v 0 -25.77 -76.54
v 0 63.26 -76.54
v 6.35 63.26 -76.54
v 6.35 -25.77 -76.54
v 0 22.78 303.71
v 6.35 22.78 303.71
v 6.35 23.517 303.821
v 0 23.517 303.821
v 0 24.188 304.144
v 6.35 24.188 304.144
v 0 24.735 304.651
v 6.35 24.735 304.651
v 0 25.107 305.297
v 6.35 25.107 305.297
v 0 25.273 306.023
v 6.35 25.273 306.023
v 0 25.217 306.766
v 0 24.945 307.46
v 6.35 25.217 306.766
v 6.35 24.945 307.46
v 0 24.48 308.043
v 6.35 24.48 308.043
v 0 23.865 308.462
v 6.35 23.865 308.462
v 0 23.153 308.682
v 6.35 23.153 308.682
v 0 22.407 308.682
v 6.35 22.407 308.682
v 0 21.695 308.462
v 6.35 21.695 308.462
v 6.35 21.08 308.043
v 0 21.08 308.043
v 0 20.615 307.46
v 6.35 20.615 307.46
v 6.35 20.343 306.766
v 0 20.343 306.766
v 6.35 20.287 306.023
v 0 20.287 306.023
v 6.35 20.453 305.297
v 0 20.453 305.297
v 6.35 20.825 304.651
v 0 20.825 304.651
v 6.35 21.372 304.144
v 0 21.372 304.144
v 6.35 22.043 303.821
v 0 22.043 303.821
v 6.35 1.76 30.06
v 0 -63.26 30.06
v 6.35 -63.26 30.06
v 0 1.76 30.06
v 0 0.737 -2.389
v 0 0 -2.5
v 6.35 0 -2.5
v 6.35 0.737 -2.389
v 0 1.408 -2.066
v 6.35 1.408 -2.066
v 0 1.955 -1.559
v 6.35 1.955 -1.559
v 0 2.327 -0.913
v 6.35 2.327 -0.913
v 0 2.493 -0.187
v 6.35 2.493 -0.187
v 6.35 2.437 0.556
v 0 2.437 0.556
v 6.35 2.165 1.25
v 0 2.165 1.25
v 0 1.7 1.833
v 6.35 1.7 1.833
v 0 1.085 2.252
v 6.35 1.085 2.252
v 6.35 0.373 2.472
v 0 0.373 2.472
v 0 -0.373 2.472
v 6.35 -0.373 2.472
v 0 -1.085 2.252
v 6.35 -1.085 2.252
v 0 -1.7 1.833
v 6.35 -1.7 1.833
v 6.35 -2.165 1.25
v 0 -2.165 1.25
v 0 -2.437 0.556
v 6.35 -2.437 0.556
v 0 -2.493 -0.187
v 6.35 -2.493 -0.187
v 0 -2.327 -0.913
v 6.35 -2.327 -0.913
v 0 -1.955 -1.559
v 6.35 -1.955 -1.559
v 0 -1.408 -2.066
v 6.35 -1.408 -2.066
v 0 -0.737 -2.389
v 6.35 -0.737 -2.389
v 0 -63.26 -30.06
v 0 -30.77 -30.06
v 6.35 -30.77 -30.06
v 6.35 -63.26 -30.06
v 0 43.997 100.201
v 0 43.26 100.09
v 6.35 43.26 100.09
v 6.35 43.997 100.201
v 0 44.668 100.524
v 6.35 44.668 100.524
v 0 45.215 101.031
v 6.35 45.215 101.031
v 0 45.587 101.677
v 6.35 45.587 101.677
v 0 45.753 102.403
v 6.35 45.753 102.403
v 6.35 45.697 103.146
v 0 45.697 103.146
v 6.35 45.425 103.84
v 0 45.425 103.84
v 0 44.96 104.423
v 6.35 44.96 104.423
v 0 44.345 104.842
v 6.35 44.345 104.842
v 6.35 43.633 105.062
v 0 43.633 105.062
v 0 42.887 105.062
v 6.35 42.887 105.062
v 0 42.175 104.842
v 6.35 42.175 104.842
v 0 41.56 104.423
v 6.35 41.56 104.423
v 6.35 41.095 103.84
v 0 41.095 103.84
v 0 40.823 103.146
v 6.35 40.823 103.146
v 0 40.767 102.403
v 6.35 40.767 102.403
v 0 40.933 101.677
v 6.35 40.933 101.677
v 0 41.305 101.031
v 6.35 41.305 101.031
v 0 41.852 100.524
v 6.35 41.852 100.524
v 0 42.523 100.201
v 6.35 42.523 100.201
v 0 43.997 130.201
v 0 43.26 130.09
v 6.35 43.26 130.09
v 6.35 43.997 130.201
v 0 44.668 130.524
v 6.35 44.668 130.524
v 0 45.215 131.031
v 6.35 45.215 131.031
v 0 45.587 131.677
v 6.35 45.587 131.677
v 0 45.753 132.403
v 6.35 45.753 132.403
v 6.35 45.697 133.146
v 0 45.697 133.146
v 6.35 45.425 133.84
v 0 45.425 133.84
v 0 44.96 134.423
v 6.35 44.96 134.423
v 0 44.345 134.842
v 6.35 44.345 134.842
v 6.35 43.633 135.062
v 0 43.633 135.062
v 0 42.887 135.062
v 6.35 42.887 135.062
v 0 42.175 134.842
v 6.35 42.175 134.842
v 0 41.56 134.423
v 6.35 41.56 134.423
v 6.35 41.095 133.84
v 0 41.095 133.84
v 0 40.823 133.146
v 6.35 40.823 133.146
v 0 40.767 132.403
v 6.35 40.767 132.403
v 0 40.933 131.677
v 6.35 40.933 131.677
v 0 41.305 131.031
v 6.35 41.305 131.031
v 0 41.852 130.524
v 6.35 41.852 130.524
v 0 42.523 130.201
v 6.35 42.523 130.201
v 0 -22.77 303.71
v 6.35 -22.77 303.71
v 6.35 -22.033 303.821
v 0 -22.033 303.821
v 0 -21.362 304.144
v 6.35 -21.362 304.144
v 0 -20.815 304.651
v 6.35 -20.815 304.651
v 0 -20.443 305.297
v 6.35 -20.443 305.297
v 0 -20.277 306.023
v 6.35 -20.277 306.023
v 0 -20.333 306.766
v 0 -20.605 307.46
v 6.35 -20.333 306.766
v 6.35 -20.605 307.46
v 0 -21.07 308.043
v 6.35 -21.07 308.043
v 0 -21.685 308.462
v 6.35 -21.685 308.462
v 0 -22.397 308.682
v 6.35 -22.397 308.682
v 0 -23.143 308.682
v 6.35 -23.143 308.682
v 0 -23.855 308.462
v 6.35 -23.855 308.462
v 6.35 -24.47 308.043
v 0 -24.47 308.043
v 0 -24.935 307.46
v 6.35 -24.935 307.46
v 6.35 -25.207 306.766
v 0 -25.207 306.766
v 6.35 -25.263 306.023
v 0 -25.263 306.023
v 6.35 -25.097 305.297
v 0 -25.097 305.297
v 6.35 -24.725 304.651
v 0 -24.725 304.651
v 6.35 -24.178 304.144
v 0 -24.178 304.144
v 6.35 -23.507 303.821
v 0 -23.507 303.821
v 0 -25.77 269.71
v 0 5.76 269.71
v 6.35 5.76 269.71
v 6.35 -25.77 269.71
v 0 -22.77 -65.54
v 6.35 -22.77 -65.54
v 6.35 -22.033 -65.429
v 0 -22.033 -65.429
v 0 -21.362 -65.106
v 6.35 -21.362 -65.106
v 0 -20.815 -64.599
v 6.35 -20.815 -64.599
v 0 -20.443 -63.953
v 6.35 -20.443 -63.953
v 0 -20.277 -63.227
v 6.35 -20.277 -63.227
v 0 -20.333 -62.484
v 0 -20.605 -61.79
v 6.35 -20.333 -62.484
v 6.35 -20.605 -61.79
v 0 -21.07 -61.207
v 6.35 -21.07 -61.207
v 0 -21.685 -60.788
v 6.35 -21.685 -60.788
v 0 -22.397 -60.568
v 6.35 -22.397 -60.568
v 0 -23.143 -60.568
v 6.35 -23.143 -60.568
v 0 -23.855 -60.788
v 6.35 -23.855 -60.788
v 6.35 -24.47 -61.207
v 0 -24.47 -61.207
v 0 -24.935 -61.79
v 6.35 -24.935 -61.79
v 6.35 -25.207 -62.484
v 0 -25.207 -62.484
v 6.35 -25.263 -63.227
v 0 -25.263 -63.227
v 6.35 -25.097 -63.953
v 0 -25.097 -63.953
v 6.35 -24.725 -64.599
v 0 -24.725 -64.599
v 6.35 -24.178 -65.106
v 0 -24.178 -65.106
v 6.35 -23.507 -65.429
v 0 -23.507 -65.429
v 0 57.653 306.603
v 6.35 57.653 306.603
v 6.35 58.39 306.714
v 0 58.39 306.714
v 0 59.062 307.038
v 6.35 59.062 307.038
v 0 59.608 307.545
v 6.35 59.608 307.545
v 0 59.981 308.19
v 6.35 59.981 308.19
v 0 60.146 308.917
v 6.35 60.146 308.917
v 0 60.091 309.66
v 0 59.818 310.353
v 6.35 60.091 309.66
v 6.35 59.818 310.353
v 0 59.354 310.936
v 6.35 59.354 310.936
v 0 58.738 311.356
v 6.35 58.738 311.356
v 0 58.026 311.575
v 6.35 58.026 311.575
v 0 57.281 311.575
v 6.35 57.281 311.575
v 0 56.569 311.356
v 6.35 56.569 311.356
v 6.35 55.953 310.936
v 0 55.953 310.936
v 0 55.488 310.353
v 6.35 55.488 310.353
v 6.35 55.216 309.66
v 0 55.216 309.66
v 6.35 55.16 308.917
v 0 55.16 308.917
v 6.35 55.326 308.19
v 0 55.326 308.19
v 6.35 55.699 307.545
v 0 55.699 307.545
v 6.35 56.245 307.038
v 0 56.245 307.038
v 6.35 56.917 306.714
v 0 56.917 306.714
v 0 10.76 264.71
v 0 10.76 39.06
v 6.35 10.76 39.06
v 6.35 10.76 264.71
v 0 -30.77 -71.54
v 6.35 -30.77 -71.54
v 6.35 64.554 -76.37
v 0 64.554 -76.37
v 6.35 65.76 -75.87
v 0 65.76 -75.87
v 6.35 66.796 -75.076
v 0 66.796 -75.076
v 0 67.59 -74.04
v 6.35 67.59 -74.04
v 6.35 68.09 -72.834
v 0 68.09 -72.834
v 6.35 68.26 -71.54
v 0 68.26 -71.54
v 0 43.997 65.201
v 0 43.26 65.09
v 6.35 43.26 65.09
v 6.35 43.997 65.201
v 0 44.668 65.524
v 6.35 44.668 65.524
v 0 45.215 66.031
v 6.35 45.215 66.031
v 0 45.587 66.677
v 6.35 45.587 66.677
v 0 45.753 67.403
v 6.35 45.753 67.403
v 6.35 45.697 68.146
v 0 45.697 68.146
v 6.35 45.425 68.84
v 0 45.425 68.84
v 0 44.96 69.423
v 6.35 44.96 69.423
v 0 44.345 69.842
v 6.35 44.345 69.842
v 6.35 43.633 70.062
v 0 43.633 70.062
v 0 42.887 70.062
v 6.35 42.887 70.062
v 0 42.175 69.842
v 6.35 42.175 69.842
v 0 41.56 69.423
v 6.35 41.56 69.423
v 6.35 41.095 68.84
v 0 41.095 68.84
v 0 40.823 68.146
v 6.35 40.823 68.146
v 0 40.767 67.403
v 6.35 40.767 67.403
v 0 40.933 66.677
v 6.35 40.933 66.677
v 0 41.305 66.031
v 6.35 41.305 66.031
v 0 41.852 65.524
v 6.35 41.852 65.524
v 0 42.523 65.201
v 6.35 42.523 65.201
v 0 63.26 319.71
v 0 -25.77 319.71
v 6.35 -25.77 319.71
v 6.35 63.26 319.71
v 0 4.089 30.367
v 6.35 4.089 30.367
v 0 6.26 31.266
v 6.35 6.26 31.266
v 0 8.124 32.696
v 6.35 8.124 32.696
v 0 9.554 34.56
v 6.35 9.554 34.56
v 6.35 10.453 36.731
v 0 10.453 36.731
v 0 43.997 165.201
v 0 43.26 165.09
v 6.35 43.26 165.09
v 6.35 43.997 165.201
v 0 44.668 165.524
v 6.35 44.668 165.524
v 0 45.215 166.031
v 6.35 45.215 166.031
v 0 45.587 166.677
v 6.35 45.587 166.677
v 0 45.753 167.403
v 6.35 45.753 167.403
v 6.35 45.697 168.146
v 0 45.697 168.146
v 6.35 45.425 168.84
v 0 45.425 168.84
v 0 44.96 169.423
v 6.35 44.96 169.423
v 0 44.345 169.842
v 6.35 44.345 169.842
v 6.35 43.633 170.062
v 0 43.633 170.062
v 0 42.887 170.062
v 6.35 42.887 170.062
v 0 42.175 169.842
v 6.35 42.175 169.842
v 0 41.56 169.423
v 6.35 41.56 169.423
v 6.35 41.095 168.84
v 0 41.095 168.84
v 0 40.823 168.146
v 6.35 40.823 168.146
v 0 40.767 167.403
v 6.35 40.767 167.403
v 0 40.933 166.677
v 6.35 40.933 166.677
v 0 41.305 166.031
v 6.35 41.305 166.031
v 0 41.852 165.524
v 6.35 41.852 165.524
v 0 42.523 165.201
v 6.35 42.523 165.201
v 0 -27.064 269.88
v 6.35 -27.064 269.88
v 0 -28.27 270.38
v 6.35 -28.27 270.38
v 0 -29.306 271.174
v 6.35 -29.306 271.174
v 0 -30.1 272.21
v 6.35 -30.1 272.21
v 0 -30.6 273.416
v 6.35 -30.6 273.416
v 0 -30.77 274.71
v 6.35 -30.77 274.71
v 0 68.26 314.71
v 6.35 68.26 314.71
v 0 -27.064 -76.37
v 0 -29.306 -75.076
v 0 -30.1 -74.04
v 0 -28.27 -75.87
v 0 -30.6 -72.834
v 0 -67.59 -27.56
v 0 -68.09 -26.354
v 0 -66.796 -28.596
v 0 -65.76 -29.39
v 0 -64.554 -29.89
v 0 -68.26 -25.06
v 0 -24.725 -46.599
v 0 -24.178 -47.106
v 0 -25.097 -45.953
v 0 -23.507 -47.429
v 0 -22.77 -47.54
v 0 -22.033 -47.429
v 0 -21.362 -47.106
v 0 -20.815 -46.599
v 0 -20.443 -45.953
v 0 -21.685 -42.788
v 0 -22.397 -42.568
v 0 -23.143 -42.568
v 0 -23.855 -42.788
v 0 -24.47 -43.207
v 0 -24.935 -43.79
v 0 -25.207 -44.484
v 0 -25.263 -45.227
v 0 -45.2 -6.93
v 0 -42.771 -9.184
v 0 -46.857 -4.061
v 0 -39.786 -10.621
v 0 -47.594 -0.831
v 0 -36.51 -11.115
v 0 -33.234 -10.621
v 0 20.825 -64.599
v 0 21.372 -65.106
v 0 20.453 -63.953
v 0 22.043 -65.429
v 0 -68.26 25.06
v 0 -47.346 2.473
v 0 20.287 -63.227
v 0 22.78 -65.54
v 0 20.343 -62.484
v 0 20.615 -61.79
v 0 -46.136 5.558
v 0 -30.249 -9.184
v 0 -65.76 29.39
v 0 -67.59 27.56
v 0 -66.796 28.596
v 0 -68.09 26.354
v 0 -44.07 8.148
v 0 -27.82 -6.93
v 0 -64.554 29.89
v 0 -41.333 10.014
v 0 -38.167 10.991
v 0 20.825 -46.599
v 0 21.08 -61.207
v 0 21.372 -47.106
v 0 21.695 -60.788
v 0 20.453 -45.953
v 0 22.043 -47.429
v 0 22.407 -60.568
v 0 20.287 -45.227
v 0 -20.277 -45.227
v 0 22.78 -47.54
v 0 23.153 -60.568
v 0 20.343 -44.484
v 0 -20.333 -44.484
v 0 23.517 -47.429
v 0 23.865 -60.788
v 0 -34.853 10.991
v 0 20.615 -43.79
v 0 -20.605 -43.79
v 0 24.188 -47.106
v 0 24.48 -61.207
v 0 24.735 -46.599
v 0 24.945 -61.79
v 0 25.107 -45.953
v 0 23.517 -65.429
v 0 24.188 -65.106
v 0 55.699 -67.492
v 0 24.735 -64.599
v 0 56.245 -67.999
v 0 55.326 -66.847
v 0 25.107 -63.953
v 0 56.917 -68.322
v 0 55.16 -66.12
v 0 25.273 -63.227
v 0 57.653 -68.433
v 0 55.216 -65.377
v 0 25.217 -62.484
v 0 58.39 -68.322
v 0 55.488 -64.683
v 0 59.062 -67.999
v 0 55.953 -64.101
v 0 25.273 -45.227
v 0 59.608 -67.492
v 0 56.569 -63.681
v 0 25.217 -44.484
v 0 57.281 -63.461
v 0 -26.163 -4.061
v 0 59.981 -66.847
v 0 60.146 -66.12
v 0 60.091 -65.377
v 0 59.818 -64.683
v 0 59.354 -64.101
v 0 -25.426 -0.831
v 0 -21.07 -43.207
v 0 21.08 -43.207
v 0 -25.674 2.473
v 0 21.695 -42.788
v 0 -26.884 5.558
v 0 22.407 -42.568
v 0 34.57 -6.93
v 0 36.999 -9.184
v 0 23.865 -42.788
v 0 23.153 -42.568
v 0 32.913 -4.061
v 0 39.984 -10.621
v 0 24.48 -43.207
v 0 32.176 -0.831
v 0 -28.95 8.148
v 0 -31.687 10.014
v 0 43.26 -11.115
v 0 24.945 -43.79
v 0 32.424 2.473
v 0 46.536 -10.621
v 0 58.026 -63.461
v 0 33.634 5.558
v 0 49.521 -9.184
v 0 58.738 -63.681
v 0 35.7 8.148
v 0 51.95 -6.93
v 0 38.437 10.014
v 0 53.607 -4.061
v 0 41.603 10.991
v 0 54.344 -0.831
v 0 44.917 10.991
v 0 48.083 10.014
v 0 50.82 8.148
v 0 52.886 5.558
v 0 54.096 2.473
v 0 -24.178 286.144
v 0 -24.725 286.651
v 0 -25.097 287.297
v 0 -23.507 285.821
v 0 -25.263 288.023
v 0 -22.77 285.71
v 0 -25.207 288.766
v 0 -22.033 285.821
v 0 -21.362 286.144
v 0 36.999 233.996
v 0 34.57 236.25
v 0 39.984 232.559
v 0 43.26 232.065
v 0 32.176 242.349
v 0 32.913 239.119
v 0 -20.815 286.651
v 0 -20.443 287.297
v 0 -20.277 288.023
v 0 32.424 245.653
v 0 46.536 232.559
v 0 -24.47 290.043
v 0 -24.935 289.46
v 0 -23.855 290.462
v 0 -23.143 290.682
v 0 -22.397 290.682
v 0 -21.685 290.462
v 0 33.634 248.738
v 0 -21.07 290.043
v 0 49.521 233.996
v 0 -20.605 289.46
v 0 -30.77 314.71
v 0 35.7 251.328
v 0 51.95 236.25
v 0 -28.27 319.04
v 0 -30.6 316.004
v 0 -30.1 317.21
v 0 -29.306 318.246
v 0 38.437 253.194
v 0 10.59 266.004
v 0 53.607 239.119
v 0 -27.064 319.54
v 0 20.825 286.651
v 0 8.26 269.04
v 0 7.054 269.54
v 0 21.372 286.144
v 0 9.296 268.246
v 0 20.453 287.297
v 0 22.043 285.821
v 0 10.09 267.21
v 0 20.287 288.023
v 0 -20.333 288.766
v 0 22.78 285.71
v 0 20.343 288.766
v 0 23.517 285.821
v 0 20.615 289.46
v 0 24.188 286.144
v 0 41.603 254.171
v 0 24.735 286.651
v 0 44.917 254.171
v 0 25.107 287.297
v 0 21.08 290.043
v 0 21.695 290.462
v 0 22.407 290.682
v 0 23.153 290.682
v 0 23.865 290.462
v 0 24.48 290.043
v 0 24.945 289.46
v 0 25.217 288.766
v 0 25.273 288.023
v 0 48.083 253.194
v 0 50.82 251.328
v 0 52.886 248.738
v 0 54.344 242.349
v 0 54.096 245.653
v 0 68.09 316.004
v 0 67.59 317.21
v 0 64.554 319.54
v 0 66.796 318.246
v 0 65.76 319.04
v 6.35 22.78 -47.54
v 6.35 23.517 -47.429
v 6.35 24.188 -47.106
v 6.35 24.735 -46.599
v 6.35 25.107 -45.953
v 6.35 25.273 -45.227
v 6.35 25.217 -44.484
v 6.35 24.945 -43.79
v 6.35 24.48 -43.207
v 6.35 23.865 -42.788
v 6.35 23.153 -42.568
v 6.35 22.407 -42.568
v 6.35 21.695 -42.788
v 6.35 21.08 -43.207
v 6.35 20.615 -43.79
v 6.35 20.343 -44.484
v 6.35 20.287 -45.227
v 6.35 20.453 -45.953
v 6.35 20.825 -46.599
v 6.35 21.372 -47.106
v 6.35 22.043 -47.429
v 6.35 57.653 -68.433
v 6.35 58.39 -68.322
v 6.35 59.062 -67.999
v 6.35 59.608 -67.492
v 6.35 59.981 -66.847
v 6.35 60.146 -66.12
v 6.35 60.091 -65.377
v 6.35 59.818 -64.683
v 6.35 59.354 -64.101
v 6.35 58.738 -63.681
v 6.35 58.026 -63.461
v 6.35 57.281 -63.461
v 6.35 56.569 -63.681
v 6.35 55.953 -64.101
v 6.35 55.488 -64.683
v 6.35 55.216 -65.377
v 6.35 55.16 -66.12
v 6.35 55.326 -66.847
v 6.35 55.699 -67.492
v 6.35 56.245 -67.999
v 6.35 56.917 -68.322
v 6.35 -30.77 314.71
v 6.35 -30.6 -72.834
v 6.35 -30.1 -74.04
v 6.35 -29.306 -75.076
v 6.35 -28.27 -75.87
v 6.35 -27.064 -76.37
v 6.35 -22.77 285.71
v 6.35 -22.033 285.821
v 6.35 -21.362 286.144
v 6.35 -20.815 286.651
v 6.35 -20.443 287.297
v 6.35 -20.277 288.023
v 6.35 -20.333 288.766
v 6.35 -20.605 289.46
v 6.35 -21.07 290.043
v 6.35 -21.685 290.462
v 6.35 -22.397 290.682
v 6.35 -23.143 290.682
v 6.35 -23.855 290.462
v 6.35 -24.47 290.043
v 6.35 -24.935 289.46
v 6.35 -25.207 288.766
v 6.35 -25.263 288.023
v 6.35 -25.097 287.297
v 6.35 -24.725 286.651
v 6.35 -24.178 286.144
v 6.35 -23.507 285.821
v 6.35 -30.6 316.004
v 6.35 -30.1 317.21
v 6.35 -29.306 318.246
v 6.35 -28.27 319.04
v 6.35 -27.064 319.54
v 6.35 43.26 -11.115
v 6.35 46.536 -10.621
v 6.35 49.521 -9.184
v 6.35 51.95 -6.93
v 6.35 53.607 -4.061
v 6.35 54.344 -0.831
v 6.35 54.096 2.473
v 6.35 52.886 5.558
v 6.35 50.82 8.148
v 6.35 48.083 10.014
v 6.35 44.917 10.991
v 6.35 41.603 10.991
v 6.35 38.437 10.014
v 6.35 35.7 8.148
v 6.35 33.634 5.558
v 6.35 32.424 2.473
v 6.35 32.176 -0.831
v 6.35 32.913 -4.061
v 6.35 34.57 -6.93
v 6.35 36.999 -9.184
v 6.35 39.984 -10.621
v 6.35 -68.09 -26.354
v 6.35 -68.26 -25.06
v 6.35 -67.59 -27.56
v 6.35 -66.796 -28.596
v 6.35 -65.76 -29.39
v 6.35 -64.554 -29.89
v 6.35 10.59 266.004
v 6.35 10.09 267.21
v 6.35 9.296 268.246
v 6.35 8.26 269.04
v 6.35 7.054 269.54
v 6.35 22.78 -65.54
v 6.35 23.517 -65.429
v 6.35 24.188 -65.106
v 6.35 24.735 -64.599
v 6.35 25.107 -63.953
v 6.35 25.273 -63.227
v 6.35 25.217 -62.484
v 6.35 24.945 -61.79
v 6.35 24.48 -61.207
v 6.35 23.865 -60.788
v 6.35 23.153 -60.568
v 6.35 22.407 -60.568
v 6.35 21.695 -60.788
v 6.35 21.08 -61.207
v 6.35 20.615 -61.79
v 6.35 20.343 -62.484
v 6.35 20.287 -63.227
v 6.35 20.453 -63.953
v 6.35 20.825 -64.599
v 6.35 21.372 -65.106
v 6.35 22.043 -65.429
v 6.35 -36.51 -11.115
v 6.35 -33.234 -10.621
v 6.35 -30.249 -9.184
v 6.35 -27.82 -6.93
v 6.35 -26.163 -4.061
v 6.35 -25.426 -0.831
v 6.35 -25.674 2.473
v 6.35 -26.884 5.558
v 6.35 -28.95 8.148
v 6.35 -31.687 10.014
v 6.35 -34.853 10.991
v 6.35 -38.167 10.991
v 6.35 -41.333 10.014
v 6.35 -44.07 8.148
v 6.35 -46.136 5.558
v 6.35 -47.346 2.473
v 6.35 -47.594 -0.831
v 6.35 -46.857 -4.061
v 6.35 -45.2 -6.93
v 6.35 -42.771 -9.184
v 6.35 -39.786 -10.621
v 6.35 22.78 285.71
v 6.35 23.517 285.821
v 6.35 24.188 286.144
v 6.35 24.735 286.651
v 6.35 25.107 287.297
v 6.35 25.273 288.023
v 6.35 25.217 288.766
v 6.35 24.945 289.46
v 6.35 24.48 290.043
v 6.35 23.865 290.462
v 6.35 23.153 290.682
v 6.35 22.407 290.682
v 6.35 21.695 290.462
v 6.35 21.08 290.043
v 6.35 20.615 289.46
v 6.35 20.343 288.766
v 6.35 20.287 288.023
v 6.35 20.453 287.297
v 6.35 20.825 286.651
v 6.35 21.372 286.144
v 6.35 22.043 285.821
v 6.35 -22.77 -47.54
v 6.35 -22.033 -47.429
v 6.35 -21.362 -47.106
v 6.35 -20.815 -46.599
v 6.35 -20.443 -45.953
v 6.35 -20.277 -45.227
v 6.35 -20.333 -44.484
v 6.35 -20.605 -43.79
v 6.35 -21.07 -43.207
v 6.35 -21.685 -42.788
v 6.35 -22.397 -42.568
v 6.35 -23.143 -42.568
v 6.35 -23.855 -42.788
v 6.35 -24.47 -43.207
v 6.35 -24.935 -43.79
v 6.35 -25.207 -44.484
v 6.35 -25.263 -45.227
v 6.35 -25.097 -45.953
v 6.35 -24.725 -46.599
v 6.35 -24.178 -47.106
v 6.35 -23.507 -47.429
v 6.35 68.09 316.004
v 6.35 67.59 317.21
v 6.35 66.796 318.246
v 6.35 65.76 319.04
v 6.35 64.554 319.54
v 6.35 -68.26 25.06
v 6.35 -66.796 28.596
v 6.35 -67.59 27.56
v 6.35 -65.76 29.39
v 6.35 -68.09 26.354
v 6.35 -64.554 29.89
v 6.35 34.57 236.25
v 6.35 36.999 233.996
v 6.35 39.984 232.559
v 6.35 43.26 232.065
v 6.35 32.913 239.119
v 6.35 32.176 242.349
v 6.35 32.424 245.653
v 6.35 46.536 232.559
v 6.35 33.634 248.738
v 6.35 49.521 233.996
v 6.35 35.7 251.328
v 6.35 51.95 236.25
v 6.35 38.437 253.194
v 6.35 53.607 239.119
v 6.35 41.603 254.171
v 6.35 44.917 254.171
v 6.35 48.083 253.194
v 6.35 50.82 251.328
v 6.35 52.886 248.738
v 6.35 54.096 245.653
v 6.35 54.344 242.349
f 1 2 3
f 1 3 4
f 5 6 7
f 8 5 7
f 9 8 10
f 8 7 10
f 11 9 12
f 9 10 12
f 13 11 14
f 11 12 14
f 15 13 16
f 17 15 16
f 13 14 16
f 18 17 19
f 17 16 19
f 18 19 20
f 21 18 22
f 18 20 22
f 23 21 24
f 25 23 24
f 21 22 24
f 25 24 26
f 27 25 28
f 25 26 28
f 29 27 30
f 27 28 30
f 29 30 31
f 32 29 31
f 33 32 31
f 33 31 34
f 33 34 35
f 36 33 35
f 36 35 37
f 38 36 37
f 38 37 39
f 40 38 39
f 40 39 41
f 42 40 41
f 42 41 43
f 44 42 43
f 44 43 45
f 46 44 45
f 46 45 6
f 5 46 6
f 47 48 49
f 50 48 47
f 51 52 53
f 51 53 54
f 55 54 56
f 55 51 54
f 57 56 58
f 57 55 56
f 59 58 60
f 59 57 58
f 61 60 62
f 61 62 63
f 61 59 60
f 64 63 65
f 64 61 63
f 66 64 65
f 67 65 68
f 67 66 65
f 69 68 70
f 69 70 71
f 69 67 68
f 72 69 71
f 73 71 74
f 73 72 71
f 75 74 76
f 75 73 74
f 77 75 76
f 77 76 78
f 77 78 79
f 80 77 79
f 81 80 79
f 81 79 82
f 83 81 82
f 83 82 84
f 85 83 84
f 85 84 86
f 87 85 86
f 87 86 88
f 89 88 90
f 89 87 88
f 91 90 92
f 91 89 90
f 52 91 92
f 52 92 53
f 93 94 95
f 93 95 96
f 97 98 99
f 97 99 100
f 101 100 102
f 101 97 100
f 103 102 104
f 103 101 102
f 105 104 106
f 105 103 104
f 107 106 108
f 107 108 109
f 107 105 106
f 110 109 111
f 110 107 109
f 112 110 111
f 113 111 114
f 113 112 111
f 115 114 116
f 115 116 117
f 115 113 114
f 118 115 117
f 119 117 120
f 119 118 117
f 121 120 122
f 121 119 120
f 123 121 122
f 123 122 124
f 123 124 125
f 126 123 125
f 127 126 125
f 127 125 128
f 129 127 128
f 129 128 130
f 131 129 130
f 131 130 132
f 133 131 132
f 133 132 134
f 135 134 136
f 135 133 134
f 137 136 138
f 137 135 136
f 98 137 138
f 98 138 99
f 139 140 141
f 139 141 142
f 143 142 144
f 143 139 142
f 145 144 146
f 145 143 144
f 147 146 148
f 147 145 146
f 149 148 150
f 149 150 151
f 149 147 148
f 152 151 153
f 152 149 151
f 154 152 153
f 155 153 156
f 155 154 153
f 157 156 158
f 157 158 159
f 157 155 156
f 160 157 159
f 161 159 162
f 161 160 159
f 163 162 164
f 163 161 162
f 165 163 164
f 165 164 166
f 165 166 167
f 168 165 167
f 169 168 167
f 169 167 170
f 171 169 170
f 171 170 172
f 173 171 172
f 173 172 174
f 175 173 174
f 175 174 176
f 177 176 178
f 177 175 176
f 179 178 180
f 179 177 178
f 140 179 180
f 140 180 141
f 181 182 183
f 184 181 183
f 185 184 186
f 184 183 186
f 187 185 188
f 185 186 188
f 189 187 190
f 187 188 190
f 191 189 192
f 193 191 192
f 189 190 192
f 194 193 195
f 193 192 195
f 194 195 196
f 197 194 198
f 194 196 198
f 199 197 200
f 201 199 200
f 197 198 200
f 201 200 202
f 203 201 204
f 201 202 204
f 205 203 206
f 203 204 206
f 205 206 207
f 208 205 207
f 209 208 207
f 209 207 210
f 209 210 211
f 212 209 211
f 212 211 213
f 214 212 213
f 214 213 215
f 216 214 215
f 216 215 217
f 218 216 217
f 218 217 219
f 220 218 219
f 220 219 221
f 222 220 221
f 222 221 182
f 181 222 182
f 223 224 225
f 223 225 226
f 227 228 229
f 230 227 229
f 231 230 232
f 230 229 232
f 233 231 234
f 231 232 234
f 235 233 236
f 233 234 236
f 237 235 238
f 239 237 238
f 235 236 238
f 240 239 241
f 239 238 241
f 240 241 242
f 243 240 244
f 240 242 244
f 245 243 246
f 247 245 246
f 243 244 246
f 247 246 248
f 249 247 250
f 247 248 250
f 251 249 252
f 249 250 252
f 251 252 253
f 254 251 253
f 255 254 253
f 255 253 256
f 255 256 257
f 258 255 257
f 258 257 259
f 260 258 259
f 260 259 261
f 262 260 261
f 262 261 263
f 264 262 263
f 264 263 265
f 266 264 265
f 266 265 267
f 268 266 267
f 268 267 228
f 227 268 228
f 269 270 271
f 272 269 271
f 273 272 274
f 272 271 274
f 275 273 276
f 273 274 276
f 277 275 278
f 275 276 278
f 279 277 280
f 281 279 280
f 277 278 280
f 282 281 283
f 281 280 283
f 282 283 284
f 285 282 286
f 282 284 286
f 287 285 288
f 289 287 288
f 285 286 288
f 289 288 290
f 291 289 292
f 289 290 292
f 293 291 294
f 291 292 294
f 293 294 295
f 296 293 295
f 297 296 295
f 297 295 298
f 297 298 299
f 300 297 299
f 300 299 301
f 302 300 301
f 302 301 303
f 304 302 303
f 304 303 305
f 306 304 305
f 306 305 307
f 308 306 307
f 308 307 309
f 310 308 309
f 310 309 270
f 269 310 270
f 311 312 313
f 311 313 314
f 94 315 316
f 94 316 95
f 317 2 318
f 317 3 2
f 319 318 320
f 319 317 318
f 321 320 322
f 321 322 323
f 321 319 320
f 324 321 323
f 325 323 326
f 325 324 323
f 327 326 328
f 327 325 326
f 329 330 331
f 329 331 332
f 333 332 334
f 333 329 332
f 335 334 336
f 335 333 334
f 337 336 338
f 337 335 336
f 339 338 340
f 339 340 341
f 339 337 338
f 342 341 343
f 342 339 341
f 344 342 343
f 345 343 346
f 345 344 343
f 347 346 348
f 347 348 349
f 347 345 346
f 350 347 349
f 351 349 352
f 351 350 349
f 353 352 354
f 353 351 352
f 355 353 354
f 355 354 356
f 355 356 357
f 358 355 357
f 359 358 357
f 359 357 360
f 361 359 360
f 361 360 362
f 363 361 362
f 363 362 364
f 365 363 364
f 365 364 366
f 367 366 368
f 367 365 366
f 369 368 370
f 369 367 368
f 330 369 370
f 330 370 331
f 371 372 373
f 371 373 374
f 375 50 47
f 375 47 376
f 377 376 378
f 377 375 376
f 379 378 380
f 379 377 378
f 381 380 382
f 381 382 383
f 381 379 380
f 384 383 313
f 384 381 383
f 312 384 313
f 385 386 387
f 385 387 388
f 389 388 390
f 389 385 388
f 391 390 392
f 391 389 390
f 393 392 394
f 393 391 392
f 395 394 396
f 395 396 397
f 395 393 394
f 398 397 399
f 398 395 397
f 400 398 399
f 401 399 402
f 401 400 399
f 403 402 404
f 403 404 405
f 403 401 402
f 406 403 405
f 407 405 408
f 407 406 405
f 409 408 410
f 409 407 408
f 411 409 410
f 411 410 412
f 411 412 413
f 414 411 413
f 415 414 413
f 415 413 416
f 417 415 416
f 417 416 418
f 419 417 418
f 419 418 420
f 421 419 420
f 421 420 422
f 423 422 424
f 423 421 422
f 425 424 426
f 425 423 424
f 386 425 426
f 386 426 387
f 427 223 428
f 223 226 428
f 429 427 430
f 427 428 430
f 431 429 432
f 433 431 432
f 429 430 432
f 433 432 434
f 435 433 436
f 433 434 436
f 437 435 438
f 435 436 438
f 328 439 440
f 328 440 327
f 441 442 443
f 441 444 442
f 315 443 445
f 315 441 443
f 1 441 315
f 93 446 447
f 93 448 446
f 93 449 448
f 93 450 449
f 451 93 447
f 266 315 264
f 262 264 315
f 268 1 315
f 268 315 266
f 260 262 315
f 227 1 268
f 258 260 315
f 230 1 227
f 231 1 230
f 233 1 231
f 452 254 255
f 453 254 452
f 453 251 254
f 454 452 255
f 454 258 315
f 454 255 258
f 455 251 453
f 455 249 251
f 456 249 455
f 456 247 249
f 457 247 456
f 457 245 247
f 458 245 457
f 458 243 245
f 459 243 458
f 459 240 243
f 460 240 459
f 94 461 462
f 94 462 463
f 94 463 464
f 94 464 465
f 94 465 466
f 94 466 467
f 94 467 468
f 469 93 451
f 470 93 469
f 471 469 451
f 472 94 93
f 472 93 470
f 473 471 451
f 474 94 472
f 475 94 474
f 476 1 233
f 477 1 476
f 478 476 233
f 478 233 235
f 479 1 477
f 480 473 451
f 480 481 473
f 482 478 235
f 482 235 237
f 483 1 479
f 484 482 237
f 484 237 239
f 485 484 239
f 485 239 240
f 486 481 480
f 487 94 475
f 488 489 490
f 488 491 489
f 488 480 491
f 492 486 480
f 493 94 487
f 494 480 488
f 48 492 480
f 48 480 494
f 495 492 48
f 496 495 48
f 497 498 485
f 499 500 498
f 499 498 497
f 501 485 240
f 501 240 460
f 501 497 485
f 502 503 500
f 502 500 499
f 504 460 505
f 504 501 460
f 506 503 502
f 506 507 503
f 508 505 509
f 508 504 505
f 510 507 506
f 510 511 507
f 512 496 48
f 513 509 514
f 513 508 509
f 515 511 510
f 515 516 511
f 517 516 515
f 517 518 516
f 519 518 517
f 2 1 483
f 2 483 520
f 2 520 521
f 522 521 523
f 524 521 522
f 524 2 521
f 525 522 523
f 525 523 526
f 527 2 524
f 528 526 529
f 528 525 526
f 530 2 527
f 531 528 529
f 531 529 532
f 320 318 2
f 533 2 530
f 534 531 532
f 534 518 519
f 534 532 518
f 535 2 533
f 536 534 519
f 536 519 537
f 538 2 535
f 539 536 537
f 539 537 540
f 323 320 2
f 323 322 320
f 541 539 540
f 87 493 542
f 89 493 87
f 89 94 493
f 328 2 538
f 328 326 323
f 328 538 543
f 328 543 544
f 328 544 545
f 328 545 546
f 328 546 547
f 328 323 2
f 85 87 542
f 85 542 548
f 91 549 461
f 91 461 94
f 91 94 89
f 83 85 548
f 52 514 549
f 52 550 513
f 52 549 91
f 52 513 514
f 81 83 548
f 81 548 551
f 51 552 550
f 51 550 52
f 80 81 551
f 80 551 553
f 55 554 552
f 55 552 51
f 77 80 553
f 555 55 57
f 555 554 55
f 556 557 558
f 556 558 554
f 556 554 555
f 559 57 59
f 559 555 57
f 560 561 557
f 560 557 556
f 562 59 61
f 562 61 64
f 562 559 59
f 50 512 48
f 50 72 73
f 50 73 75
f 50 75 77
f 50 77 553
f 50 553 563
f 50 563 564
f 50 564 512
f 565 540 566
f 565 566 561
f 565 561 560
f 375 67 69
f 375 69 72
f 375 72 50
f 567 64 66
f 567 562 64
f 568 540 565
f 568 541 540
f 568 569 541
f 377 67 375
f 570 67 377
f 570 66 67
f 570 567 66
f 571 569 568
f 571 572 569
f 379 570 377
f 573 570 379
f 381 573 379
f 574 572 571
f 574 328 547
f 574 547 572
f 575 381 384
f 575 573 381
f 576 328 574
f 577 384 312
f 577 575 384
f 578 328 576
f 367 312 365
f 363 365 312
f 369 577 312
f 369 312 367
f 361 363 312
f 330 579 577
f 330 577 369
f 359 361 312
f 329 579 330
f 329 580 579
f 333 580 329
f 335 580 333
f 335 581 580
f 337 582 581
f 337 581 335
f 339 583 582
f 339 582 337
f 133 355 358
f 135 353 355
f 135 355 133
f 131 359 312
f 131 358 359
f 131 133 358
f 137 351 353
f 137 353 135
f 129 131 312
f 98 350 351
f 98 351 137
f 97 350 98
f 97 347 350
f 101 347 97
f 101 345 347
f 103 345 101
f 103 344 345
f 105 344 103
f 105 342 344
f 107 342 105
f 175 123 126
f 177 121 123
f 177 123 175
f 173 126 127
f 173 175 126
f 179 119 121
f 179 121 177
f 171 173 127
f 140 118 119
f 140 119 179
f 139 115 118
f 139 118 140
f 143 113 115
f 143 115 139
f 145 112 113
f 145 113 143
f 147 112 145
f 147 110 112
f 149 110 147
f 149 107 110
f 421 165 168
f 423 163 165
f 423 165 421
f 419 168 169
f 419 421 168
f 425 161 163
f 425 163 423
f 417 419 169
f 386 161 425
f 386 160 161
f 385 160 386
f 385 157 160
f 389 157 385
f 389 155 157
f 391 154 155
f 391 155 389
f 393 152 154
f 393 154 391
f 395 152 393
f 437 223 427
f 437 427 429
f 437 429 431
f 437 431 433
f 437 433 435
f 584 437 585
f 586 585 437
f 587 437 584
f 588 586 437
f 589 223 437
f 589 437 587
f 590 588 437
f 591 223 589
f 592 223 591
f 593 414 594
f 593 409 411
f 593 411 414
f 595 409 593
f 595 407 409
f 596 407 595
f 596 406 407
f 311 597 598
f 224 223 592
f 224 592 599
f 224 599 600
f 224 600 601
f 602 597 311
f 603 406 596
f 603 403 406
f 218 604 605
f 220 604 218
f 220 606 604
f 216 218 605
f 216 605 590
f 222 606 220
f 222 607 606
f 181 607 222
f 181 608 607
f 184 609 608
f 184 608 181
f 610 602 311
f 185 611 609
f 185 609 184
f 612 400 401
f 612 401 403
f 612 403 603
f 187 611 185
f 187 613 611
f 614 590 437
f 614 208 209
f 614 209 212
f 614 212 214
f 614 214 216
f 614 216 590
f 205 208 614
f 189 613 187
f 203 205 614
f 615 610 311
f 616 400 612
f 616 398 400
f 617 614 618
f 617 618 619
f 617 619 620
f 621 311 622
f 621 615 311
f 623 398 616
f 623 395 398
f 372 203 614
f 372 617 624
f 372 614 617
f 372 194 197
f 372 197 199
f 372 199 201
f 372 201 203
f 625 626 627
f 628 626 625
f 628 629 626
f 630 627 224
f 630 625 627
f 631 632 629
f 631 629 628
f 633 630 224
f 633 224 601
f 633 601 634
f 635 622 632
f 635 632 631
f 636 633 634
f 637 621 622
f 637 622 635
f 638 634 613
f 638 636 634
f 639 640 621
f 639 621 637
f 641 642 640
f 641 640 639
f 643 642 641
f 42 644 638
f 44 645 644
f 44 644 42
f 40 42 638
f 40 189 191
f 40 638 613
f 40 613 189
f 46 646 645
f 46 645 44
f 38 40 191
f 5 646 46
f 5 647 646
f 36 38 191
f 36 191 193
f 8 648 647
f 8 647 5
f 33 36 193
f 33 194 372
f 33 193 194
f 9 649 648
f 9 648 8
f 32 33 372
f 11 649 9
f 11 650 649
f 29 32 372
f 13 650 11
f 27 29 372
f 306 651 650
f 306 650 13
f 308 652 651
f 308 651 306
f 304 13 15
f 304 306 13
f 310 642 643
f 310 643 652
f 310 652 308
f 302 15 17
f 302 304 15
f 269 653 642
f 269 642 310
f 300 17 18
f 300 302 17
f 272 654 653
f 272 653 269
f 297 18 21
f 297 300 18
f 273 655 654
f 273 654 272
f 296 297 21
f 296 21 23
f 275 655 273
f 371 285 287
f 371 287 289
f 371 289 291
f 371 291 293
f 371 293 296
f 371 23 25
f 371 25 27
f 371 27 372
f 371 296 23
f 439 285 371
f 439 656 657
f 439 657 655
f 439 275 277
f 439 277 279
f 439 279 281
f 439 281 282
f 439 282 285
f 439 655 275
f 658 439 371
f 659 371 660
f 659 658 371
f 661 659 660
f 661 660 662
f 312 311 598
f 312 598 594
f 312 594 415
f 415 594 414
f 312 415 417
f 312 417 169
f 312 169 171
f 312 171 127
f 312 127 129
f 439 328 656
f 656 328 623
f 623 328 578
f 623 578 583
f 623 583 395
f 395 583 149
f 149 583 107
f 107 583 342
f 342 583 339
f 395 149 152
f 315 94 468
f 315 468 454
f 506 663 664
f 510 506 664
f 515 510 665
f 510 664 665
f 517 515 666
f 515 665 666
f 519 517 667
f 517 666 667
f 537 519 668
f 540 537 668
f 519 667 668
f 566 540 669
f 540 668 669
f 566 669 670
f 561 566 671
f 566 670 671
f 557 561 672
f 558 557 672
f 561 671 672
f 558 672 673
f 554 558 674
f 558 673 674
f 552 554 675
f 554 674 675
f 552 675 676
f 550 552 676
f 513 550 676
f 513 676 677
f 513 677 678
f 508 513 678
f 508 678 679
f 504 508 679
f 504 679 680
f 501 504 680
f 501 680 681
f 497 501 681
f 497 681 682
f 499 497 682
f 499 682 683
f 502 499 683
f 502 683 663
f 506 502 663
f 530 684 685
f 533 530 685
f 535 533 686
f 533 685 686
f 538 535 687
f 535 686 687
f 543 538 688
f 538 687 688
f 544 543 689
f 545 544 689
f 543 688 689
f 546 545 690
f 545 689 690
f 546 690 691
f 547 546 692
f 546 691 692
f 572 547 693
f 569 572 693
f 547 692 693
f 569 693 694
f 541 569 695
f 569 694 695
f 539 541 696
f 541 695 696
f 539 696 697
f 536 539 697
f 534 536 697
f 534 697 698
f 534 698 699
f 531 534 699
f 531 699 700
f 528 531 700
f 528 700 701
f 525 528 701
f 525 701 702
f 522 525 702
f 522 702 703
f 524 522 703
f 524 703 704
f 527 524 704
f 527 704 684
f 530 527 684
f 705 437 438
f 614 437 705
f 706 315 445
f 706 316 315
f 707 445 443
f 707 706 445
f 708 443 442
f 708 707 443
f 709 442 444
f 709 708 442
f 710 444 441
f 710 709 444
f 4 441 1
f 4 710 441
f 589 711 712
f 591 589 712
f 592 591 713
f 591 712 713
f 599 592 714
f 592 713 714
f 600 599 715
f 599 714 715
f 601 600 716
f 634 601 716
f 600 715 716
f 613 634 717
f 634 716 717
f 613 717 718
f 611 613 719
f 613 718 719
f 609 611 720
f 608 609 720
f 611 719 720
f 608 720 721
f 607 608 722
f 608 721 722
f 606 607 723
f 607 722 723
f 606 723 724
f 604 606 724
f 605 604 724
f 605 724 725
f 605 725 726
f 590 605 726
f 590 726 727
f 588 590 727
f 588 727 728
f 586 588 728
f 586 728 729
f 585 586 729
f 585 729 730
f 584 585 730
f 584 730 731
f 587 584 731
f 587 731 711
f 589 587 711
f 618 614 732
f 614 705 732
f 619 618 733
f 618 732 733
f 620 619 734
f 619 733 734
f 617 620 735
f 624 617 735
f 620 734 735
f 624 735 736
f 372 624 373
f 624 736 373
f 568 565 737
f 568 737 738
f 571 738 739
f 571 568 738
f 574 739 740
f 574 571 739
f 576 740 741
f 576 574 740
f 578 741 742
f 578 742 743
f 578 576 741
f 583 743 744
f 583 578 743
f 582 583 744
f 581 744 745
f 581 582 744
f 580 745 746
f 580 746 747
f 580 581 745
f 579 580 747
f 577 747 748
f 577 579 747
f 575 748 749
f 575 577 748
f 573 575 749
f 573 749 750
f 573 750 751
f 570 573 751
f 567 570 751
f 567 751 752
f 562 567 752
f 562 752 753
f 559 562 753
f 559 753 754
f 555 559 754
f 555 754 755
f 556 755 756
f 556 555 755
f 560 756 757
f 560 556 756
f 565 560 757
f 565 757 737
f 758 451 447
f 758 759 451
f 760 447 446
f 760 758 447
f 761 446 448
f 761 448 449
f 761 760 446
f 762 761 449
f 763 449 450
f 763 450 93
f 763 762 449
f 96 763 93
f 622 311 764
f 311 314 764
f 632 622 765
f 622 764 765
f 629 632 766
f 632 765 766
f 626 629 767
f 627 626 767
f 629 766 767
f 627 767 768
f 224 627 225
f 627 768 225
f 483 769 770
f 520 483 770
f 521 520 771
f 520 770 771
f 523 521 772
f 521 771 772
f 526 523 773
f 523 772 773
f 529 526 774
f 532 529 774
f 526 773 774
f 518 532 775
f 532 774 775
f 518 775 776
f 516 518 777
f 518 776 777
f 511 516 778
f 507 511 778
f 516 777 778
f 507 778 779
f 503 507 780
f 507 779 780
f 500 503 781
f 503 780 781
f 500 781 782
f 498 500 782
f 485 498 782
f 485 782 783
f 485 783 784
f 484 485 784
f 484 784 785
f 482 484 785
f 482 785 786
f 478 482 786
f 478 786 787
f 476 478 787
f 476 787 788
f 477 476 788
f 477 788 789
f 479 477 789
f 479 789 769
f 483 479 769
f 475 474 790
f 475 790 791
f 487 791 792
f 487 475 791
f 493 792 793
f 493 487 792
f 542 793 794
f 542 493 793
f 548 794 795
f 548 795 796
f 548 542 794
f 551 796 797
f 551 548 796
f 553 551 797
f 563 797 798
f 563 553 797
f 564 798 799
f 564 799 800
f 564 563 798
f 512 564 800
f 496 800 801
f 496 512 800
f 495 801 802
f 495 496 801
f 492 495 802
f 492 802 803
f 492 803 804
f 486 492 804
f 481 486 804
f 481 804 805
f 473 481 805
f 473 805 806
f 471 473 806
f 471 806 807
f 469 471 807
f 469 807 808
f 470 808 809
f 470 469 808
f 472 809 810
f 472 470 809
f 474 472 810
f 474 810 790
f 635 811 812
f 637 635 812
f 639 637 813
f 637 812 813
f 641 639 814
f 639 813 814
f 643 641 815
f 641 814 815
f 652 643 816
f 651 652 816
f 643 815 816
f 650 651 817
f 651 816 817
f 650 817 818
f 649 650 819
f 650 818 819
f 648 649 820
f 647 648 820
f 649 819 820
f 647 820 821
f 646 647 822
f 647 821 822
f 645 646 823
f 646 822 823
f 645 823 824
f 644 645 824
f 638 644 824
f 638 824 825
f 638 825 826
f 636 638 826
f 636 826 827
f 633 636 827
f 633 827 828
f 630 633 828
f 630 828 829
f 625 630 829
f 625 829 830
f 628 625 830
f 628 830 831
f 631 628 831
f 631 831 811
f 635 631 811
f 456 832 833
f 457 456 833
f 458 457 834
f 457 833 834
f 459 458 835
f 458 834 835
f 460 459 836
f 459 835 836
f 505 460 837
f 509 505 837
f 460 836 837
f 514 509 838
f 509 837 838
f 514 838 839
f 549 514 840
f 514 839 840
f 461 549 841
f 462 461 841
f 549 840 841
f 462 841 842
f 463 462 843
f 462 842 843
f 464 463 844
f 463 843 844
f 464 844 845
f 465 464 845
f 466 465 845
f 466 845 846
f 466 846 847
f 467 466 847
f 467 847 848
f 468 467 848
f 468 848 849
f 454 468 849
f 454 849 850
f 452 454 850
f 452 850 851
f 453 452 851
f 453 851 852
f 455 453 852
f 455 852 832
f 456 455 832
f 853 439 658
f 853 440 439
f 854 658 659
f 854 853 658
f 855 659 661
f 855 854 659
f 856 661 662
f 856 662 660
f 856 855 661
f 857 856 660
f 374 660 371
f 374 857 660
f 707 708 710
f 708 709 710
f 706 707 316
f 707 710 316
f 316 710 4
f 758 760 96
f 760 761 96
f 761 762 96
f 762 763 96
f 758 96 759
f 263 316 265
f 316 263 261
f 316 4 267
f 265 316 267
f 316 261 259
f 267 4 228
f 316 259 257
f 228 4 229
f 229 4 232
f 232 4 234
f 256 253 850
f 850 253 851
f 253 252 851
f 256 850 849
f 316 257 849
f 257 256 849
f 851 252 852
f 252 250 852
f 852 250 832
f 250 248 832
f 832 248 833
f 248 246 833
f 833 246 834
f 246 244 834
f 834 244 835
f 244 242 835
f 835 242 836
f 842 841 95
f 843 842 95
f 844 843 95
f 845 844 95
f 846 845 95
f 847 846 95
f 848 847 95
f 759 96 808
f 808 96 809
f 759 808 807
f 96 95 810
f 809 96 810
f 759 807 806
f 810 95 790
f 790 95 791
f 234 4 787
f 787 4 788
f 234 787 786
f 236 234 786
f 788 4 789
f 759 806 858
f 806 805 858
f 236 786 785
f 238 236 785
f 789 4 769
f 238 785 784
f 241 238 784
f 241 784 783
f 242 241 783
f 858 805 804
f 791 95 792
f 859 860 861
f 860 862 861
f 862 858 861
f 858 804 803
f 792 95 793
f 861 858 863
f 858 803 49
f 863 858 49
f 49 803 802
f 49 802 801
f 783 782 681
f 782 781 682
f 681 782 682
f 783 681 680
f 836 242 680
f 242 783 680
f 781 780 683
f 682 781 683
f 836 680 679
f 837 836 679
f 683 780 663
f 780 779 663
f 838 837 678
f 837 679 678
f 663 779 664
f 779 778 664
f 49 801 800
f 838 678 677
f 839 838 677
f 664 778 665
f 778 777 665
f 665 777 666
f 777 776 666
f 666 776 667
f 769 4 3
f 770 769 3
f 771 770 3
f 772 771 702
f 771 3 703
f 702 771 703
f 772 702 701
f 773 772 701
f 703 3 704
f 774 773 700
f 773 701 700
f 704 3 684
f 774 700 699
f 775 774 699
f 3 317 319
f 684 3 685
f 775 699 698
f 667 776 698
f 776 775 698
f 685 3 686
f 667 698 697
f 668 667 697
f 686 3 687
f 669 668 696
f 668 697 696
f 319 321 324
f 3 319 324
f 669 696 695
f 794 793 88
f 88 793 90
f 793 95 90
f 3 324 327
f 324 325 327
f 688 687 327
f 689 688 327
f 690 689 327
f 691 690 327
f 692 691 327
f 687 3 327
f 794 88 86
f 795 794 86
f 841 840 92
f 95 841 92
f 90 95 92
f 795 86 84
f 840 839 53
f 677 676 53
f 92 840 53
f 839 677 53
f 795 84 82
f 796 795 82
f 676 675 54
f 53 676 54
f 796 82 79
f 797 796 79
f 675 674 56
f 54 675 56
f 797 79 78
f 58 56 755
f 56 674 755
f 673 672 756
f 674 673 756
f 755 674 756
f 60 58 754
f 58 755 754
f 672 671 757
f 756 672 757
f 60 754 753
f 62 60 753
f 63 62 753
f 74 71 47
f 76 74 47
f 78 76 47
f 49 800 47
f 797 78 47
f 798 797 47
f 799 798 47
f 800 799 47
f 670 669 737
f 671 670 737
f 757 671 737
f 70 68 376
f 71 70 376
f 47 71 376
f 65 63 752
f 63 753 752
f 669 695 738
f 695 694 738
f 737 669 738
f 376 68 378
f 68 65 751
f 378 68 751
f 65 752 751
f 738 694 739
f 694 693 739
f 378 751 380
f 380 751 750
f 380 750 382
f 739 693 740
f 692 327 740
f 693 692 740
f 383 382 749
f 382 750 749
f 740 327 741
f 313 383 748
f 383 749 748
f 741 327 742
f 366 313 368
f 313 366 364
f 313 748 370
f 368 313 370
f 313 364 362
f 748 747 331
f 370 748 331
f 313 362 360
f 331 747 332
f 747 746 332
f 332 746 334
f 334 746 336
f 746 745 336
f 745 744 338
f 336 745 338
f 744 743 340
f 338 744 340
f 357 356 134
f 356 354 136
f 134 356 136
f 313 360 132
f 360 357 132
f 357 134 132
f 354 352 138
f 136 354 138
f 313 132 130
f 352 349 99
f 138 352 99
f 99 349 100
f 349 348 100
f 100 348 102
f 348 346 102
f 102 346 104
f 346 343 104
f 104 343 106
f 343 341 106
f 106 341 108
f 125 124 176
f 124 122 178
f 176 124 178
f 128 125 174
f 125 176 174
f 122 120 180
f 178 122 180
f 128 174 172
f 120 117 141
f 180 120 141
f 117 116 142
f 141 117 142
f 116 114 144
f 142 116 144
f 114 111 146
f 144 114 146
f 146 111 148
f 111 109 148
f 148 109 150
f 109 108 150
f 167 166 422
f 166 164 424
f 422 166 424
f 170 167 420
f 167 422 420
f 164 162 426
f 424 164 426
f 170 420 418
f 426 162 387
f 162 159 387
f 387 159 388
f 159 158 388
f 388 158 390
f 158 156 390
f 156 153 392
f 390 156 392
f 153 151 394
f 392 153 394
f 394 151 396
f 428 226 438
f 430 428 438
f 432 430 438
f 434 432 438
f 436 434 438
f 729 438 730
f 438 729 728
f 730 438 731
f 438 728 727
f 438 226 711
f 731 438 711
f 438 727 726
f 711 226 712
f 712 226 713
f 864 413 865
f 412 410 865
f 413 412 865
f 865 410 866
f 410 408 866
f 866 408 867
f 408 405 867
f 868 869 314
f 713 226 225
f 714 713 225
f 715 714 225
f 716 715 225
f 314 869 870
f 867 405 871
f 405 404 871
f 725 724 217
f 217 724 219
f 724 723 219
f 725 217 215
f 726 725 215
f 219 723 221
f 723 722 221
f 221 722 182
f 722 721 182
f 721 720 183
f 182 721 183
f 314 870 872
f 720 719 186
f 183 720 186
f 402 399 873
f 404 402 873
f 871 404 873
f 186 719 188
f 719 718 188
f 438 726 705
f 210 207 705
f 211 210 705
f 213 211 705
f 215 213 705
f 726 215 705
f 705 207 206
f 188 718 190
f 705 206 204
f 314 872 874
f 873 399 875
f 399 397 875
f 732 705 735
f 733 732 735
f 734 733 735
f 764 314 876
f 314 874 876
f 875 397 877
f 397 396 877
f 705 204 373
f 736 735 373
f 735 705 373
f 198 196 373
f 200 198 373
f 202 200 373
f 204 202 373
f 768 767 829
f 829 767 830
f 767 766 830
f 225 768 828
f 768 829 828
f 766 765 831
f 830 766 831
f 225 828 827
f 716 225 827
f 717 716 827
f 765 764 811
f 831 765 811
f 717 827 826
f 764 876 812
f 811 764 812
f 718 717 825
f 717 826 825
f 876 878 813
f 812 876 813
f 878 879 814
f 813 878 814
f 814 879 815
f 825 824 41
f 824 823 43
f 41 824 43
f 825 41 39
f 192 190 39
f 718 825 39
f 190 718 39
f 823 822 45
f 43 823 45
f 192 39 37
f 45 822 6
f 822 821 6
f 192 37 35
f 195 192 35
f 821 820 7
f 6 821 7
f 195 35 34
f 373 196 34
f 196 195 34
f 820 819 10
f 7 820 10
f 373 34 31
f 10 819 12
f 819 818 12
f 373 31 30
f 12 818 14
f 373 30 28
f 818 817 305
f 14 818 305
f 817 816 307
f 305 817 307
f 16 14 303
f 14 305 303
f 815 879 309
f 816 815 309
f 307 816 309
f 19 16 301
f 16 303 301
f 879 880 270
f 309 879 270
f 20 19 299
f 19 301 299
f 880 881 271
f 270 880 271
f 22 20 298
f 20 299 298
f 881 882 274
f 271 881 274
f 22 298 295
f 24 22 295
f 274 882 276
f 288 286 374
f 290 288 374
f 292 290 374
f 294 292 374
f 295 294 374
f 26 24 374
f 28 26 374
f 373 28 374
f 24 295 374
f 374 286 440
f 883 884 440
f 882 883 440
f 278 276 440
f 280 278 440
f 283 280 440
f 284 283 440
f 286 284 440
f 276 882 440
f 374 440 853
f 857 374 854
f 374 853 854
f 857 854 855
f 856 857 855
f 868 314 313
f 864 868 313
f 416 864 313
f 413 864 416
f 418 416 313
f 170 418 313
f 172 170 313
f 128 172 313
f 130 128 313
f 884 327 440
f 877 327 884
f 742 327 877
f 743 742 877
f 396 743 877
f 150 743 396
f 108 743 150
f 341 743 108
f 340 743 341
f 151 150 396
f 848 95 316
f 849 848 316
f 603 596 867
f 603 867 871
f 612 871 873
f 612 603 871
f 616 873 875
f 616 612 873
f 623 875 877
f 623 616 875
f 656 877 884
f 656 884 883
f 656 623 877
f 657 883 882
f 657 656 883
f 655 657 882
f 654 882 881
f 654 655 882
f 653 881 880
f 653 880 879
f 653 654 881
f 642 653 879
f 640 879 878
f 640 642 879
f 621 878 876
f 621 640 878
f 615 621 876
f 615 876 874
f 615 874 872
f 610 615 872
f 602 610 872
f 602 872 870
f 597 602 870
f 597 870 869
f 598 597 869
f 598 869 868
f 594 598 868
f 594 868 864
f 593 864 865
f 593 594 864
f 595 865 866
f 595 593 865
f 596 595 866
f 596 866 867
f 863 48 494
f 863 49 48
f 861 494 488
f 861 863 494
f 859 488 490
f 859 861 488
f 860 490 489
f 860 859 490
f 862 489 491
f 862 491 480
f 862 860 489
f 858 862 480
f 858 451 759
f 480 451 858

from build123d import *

# Parameters (mm, degrees)
CROQUIS1_R              = 11.115
CROQUIS1_R_2            = 2.5
SALIENTE_EXTRUIR1_DEPTH = 6.35
CROQUIS3_R              = 2.5
CORTAR_EXTRUIR1_DEPTH   = 10
REDONDEO1_R             = 5


with BuildPart() as part:
    # Croquis1 → Saliente-Extruir1 (new body)
    with BuildSketch(Plane(origin=(0, 0, 0), x_dir=(0, 0, -1), z_dir=(1, 0, 0))):
        with BuildLine():
            Line((-30.06, -68.26), (-30.06, 1.76))
            ThreePointArc((-30.06, 1.76), (-32.696038969, 8.123961031), (-39.06, 10.76))
            Line((-39.06, 10.76), (-269.71, 10.76))
            Line((-269.71, 10.76), (-269.71, -30.77))
            Line((-269.71, -30.77), (-319.71, -30.77))
            Line((-319.71, -30.77), (-319.71, 10.76))
            Line((-319.71, 10.76), (-319.71, 68.26))
            Line((-319.71, 68.26), (21.06, 68.26))
            Line((21.06, 68.26), (76.54, 68.26))
            Line((76.54, 68.26), (76.54, -30.77))
            Line((76.54, -30.77), (30.06, -30.77))
            Line((30.06, -30.77), (30.06, -68.26))
            Line((30.06, -68.26), (-30.06, -68.26))
        make_face()
        with Locations((0, 43.26)):
            Circle(CROQUIS1_R, mode=Mode.SUBTRACT)
        with Locations((0, -36.51)):
            Circle(CROQUIS1_R, mode=Mode.SUBTRACT)
        with Locations((-243.18, 43.26)):
            Circle(CROQUIS1_R, mode=Mode.SUBTRACT)
        Circle(CROQUIS1_R_2, mode=Mode.SUBTRACT)
        with Locations((-67.59, 43.26)):
            Circle(CROQUIS1_R_2, mode=Mode.SUBTRACT)
        with Locations((-167.59, 43.26)):
            Circle(CROQUIS1_R_2, mode=Mode.SUBTRACT)
        with Locations((-132.59, 43.26)):
            Circle(CROQUIS1_R_2, mode=Mode.SUBTRACT)
        with Locations((-102.59, 43.26)):
            Circle(CROQUIS1_R_2, mode=Mode.SUBTRACT)
    extrude(amount=SALIENTE_EXTRUIR1_DEPTH)

    # Croquis3 → Cortar-Extruir1 (cut)
    with BuildSketch(Plane(origin=(6.35, 0, 0), x_dir=(0, 0, -1), z_dir=(1, 0, 0))):
        with Locations((-288.21, -22.77)):
            Circle(CROQUIS3_R)
        with Locations((-306.21, -22.77)):
            Circle(CROQUIS3_R)
        with Locations((-306.21, 22.78)):
            Circle(CROQUIS3_R)
        with Locations((-288.21, 22.78)):
            Circle(CROQUIS3_R)
        with Locations((45.04, -22.77)):
            Circle(CROQUIS3_R)
        with Locations((63.04, -22.77)):
            Circle(CROQUIS3_R)
        with Locations((45.04, 22.78)):
            Circle(CROQUIS3_R)
        with Locations((63.04, 22.78)):
            Circle(CROQUIS3_R)
        with Locations((-309.103398282, 57.653398282)):
            Circle(CROQUIS3_R)
        with Locations((65.933398282, 57.653398282)):
            Circle(CROQUIS3_R)
    extrude(amount=-CORTAR_EXTRUIR1_DEPTH, mode=Mode.SUBTRACT)

    # Redondeo1
    redondeo1_edges = [part.edges().sort_by_distance(p)[0] for p in [
        (3.175, -68.26, -30.06),
        (3.175, -68.26, 30.06),
        (3.175, 10.76, 269.71),
        (3.175, -30.77, 269.71),
        (3.175, -30.77, 319.71),
        (3.175, 68.26, 319.71),
        (3.175, 68.26, -76.54),
        (3.175, -30.77, -76.54),
    ]]
    fillet(redondeo1_edges, radius=REDONDEO1_R)


solid = part.part
